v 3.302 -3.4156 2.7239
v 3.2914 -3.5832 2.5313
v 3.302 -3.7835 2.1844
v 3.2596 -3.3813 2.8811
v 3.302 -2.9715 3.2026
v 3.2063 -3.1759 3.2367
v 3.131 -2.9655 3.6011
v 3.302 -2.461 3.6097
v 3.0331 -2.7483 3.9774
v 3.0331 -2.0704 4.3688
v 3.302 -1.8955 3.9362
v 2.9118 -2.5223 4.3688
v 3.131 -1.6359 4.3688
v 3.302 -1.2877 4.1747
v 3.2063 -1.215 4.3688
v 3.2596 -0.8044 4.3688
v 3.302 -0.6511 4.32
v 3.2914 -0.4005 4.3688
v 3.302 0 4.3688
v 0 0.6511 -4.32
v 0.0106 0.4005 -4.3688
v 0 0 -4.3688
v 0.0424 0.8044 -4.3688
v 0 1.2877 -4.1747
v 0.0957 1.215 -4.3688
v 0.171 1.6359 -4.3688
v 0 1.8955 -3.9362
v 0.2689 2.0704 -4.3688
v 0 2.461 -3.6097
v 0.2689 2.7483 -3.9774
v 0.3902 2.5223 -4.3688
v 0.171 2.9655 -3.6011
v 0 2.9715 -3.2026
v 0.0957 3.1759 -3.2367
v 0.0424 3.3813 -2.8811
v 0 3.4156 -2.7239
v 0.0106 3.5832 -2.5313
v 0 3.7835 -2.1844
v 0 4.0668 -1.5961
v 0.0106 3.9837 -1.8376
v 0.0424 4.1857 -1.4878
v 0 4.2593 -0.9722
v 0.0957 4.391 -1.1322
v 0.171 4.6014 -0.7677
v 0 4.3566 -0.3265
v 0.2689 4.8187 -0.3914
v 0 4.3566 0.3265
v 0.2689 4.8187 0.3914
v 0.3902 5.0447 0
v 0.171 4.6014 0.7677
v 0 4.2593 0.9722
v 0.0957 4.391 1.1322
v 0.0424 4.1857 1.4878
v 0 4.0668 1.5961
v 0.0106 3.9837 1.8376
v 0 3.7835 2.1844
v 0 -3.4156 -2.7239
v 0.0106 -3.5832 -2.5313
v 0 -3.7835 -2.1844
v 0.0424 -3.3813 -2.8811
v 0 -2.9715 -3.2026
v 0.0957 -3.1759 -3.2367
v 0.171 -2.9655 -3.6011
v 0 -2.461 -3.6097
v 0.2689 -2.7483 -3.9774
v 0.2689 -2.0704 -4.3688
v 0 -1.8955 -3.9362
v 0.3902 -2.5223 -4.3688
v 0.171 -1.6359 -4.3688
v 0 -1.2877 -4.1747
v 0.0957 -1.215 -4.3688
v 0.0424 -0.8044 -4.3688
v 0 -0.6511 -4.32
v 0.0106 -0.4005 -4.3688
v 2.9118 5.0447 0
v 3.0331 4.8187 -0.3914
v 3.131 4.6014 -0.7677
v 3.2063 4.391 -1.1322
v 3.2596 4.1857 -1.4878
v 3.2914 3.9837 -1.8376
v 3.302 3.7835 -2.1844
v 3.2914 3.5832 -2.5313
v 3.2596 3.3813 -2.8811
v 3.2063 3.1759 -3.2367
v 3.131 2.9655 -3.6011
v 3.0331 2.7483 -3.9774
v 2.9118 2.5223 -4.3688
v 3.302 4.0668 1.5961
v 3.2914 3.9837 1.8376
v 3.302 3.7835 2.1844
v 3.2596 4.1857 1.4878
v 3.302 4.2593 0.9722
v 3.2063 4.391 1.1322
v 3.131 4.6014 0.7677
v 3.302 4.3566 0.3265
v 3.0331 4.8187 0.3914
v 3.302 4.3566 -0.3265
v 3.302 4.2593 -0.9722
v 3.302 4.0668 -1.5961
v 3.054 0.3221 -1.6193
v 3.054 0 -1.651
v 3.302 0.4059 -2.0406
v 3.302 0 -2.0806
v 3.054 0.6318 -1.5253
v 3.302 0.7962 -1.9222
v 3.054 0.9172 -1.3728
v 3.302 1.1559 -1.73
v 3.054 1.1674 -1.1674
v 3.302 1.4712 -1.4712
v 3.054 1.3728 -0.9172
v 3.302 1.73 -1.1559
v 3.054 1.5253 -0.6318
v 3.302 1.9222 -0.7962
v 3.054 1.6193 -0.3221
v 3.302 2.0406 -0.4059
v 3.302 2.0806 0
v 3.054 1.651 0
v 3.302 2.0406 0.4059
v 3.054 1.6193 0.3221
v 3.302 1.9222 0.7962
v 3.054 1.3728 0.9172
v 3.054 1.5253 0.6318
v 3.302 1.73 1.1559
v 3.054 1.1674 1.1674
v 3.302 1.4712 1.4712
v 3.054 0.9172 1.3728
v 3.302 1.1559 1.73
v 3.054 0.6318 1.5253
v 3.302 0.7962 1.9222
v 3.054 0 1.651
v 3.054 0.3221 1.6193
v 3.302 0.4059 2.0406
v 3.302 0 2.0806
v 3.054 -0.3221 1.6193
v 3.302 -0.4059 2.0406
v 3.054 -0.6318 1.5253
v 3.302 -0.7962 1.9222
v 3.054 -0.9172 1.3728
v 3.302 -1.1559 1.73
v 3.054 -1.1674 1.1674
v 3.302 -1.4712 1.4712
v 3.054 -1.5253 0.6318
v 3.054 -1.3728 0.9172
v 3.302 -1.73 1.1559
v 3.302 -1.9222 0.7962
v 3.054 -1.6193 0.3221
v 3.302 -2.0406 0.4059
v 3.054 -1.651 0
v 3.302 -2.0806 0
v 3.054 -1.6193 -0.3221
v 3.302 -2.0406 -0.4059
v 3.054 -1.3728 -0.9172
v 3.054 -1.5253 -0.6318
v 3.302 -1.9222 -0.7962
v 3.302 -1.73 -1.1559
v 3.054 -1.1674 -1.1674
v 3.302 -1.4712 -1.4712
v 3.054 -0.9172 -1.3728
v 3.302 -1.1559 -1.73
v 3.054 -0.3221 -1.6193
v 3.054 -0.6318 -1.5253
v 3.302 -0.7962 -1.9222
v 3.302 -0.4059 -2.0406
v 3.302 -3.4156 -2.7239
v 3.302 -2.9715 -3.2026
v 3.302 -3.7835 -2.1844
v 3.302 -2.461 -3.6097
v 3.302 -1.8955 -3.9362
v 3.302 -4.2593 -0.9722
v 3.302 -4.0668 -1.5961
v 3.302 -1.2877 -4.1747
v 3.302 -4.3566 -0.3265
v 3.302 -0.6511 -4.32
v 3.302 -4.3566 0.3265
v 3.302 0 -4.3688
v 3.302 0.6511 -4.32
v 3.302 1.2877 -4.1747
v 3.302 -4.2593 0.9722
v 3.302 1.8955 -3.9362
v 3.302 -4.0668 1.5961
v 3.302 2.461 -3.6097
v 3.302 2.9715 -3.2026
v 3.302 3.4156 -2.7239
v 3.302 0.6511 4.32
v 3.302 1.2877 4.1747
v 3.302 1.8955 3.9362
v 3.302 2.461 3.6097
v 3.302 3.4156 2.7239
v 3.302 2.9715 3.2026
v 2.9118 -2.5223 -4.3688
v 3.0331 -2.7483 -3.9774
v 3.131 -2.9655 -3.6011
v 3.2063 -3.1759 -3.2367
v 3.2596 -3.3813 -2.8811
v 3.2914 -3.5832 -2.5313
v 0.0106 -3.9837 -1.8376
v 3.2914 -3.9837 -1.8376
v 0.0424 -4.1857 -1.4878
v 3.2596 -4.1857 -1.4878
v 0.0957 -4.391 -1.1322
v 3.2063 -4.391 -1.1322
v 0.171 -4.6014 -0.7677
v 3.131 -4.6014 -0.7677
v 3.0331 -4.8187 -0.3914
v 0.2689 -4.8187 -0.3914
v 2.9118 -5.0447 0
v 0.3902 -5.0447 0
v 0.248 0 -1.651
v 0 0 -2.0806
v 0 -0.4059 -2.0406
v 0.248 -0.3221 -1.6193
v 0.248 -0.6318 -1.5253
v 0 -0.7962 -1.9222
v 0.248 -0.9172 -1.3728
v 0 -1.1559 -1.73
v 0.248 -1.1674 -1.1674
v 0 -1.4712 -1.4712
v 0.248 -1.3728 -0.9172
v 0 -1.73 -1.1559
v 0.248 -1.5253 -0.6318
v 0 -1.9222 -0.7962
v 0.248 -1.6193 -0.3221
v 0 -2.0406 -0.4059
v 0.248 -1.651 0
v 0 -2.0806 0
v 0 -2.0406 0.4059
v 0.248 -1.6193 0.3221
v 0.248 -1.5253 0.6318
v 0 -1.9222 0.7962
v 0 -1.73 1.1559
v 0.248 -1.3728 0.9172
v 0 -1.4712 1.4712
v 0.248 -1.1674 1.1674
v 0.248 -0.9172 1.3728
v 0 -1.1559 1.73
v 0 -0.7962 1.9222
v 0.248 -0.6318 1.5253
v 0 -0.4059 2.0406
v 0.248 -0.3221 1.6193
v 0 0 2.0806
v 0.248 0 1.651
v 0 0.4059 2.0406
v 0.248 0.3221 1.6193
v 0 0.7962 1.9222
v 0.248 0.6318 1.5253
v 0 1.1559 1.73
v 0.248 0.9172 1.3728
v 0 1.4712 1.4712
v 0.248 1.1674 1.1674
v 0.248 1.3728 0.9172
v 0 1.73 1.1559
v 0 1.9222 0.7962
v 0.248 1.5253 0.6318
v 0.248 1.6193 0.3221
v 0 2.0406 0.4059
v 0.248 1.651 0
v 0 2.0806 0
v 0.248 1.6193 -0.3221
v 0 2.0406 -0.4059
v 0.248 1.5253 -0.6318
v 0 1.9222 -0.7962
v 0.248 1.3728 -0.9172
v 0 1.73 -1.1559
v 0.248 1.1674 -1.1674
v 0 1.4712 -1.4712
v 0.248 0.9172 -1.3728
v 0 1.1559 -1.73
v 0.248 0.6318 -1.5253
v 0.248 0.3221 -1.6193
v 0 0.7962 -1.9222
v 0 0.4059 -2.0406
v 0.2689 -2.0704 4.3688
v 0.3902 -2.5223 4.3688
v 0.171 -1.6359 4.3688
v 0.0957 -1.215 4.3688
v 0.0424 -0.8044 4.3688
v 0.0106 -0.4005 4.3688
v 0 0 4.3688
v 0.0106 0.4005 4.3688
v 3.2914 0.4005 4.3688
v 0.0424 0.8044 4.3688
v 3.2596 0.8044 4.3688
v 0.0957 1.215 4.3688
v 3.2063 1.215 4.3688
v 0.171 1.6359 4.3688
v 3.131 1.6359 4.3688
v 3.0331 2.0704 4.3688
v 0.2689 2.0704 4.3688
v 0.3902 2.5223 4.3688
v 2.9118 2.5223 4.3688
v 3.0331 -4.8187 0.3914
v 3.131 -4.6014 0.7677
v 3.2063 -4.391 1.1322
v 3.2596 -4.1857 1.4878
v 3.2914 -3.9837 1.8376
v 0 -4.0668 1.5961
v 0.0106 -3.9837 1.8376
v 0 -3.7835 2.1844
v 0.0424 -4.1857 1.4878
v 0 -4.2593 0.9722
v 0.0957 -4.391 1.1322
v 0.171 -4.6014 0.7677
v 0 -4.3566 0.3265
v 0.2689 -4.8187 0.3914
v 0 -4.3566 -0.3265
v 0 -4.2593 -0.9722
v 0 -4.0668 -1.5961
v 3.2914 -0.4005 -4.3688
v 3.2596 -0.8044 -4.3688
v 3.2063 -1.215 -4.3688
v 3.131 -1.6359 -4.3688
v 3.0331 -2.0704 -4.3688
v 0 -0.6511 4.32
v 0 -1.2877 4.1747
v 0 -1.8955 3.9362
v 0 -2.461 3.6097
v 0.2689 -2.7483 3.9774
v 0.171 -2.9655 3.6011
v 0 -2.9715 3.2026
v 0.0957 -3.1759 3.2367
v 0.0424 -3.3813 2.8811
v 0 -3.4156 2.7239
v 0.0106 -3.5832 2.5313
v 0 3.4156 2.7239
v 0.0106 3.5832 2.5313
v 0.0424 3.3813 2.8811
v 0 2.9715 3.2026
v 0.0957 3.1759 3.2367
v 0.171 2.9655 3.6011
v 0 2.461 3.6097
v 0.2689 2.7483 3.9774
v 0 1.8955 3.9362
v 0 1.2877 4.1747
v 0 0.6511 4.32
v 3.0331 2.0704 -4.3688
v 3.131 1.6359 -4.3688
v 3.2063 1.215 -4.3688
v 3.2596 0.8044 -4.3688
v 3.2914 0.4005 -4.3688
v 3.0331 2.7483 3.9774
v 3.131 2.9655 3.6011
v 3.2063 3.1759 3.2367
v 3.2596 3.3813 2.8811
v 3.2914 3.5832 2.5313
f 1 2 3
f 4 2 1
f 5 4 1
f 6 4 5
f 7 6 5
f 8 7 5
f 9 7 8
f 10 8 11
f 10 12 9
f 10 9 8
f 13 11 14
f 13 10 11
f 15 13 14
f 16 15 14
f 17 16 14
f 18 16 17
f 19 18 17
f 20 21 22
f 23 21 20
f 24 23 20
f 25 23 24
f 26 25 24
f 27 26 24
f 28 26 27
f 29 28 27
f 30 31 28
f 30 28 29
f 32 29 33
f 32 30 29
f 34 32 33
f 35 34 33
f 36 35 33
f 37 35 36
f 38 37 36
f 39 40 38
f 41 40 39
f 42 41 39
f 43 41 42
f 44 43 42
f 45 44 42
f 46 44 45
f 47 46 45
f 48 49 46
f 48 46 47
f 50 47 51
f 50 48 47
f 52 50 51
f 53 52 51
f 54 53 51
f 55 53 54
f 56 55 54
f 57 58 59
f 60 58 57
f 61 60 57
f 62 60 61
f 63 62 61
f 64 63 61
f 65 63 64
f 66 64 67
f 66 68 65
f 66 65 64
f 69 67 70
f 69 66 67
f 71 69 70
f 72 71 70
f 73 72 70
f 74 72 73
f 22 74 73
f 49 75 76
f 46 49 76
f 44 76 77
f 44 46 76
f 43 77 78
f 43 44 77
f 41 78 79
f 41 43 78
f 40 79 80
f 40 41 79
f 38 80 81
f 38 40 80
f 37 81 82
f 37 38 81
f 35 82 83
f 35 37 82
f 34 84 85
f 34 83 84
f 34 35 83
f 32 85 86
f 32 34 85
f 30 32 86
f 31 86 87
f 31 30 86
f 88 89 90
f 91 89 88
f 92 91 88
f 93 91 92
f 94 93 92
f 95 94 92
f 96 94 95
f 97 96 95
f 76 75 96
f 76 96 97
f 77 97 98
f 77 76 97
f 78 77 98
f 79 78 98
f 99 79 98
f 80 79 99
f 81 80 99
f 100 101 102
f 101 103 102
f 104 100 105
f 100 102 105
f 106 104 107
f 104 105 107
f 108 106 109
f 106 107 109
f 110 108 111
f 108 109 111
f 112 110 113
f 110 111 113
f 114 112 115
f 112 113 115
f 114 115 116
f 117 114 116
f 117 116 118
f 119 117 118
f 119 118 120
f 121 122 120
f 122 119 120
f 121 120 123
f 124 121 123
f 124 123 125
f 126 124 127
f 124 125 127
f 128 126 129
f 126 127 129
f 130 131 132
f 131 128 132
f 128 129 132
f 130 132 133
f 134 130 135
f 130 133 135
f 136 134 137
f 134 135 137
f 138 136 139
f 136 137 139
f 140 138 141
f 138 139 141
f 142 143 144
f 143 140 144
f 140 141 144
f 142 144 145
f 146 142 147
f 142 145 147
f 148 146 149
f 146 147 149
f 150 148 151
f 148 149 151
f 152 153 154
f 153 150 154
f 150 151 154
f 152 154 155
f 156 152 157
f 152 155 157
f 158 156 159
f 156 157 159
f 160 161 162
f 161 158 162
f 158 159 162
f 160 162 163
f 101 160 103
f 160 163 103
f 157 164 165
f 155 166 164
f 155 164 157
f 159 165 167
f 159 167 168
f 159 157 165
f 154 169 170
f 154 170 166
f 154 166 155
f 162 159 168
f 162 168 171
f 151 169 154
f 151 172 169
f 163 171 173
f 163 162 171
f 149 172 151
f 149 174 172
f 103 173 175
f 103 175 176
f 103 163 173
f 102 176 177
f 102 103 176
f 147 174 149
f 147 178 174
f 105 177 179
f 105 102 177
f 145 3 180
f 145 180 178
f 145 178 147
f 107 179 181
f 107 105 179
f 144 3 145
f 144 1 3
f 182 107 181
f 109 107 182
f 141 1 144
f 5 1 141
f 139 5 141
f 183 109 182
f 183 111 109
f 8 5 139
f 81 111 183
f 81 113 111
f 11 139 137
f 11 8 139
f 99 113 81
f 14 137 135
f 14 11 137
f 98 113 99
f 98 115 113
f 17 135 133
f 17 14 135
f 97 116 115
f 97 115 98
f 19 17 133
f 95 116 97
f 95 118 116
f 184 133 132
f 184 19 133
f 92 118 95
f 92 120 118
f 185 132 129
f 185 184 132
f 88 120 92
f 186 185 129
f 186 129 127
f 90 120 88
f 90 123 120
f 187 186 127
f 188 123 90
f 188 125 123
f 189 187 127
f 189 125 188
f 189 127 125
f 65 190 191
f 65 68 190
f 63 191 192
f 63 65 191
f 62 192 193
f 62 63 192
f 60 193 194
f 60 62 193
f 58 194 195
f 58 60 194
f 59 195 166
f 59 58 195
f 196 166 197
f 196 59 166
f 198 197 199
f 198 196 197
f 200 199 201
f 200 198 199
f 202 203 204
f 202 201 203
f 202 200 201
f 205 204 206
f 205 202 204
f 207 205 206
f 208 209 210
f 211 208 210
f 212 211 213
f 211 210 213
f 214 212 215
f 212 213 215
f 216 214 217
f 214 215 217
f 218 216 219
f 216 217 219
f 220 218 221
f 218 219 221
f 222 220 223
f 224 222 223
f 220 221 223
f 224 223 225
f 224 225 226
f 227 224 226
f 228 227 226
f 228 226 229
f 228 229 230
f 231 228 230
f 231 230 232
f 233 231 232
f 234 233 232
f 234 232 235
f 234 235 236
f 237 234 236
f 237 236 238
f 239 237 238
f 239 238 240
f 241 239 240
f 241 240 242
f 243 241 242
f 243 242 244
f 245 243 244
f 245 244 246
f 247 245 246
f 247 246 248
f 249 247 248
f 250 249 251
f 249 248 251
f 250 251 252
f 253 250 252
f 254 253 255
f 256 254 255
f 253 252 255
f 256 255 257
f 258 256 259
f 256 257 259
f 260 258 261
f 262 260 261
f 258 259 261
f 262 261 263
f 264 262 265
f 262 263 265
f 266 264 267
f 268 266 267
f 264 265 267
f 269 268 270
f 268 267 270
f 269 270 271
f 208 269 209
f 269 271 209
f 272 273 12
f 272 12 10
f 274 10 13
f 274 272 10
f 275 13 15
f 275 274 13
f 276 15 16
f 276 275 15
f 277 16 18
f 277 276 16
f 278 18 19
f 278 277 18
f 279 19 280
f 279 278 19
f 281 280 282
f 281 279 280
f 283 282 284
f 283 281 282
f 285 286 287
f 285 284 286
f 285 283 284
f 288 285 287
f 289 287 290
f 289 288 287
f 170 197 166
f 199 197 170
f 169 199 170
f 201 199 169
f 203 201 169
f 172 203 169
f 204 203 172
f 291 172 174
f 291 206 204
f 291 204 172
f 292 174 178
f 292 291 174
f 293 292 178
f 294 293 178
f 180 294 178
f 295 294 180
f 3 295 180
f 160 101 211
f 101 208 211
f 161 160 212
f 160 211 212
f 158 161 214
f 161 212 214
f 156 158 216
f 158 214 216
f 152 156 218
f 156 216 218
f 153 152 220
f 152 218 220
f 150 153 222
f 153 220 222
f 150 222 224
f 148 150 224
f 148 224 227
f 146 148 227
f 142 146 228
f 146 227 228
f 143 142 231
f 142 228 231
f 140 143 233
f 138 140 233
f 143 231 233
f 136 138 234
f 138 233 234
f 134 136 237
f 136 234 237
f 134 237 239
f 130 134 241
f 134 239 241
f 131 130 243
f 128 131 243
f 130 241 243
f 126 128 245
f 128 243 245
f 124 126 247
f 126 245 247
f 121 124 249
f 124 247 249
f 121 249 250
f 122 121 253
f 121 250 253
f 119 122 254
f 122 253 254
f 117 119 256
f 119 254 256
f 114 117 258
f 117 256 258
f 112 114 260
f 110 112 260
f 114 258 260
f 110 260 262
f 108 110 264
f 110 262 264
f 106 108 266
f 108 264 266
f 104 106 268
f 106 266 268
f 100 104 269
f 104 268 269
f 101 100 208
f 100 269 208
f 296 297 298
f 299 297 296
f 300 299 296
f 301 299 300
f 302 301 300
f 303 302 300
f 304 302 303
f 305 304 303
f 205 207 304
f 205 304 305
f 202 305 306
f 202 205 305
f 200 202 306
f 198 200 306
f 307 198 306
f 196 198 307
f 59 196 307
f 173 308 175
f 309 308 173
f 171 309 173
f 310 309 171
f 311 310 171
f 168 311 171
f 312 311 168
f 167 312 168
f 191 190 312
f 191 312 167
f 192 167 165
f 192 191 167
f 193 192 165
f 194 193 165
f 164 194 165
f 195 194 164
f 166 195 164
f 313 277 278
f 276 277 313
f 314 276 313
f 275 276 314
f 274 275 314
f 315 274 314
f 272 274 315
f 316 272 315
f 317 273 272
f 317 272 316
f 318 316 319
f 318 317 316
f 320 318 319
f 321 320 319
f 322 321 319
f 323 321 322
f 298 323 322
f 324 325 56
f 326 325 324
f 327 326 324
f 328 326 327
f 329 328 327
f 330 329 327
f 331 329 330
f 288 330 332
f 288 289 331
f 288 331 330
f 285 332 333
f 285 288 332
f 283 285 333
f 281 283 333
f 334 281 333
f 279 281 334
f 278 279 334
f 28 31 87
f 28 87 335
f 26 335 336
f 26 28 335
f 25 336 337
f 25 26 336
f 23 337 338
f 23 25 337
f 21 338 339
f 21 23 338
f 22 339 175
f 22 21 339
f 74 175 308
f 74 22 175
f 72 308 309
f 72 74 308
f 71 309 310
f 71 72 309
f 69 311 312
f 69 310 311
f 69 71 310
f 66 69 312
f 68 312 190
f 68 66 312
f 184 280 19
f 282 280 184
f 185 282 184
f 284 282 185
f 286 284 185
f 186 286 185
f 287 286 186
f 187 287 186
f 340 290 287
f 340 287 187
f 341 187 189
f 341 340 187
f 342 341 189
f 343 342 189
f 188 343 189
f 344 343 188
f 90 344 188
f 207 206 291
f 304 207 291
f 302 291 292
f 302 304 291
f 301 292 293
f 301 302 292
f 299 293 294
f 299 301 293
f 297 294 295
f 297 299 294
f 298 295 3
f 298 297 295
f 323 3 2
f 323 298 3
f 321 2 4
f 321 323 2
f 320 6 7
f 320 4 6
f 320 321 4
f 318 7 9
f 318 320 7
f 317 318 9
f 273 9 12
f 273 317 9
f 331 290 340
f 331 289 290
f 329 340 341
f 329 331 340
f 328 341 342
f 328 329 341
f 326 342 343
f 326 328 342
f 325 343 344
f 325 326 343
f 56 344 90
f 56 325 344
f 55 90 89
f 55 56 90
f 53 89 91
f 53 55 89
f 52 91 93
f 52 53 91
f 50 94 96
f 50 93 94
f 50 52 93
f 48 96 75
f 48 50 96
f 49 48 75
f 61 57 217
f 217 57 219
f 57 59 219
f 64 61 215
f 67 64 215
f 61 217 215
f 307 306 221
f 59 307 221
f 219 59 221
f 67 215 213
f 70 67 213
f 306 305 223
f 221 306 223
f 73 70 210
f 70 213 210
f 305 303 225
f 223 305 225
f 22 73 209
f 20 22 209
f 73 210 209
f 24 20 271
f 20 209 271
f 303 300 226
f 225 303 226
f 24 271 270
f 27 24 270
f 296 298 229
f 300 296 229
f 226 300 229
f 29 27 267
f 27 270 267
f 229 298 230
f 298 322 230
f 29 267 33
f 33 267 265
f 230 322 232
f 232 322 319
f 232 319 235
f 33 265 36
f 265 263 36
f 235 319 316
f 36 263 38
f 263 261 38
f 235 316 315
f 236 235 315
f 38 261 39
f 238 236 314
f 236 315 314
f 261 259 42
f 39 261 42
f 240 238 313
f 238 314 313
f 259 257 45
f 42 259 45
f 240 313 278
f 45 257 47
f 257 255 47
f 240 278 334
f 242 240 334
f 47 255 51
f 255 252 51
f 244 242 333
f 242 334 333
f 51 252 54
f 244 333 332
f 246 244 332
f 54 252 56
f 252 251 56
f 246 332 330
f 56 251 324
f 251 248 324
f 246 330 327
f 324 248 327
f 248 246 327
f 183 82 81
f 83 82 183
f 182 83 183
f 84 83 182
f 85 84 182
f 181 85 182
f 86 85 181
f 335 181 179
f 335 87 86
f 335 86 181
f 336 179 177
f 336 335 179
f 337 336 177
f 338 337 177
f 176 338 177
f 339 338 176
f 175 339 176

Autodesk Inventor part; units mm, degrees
ref_plane "YZ Plane" through (0, 0, 0) normal (1, 0, 0) x (0, 1, 0)
ref_plane "XZ Plane" through (0, 0, 0) normal (0, 1, 0) x (-1, 0, 0)
sketch "Sketch1" plane through (0, 0, 0) normal (1, 0, 0) x (0, 1, 0)
  line L0 (-5.0447, 0) -> (-2.5223, 4.3688)
  line L1 (-2.5223, 4.3688) -> (2.5223, 4.3688)
  line L2 (2.5223, 4.3688) -> (5.0447, 0)
  line L3 (5.0447, 0) -> (2.5223, -4.3688)
  line L4 (2.5223, -4.3688) -> (-2.5223, -4.3688)
  line L5 (-2.5223, -4.3688) -> (-5.0447, 0)
  point P0 (0, 0)
  point P1 (0, 0)
  dimension "d0" = 10.0893
extrude "Body" add sketch "Sketch1" along normal blind 3.302
sketch "Sketch2" plane through (0, 0, 0) normal (0, 0, 1) x (1, 0, 0)
  line L0 (0, 2.5223) -> (0, 5.0447) projected
  line L1 (0, 5.0447) -> (3.302, 5.0447) projected
  line L2 (3.302, 2.5223) -> (3.302, 5.0447) projected
  line L3 (-0.6604, 0) -> (3.9624, 0) projected
  line L4 (0.3902, 5.0447) -> (0, 4.3688)
  line L5 (2.9118, 5.0447) -> (3.302, 4.3688)
  dimension "d3" = 30
  dimension "d4" = 30
  dimension "d5" = 8.7376
  dimension "d6" = 8.7376
revolve "Chamfer1" cut sketch "Sketch2" angle 360 about axis through (-10, 0, 0) along (1, 0, 0)
sketch "Sketch3" plane through (3.302, 0, 0) normal (1, 0, 0) x (0, 0, -1)
  arc A0 (-2.1844, -3.7835) -> (2.1844, -3.7835) centre (0, 0) ccw projected
hole "Thread" at (3.302, 0, 0) direction (-1, 0, 0) diameter 3.302 end through all thread size "8-32 UNC" class "2B" standard "ANSI Unified Screw Threads"
chamfer "Chamfer2" distance 0.4296 angle 30 1 edges at (3.302, 0, 1.651) measured on face at (3.302, 3.4429, -0.0663)
chamfer "Chamfer3" distance 0.4296 angle 30 1 edges at (0, 0, 1.651) measured on face at (0, 3.4429, -0.0663)
ref_plane "Work Plane1" through (-10.4473, 0, 0) normal (0, -0.866, -0.5) x (1, 0, 0)
equation "\"d0\" = 1.1547 * SW"
equation "\"d1\" = KOH"
equation "\"d3\" = ANG1"
equation "\"d4\" = ANG2"
equation "\"d5\" = SW0"
equation "\"d6\" = SW01"
equation "\"d8\" = -0.5 * GD1 + 0.5 * NND"
equation "\"d40\" = -0.5 * GD1 + 0.5 * NND"
equation "\"d10\" = -0.5 * GD1 + 0.5 * NND"
equation "\"d41\" = -0.5 * GD1 + 0.5 * NND"
equation "\"ANG1\" = 30deg"
equation "\"ANG2\" = 30deg"
equation "\"NND\" = 4.1656"
equation "\"KOH\" = 3.302"
equation "\"SW\" = 8.7376"
equation "\"SW0\" = SW"
equation "\"SW01\" = SW"
equation "\"THREADDIA\" = 4.1656"
equation "\"TOA\" = 30deg"
equation "\"E0\" = 1.155 * SW"
equation "\"GD1\" = 3.30634"
properties part number "ANSI B18.2.2 - 8 - 32, HMSNI" material "Steel, Mild"
